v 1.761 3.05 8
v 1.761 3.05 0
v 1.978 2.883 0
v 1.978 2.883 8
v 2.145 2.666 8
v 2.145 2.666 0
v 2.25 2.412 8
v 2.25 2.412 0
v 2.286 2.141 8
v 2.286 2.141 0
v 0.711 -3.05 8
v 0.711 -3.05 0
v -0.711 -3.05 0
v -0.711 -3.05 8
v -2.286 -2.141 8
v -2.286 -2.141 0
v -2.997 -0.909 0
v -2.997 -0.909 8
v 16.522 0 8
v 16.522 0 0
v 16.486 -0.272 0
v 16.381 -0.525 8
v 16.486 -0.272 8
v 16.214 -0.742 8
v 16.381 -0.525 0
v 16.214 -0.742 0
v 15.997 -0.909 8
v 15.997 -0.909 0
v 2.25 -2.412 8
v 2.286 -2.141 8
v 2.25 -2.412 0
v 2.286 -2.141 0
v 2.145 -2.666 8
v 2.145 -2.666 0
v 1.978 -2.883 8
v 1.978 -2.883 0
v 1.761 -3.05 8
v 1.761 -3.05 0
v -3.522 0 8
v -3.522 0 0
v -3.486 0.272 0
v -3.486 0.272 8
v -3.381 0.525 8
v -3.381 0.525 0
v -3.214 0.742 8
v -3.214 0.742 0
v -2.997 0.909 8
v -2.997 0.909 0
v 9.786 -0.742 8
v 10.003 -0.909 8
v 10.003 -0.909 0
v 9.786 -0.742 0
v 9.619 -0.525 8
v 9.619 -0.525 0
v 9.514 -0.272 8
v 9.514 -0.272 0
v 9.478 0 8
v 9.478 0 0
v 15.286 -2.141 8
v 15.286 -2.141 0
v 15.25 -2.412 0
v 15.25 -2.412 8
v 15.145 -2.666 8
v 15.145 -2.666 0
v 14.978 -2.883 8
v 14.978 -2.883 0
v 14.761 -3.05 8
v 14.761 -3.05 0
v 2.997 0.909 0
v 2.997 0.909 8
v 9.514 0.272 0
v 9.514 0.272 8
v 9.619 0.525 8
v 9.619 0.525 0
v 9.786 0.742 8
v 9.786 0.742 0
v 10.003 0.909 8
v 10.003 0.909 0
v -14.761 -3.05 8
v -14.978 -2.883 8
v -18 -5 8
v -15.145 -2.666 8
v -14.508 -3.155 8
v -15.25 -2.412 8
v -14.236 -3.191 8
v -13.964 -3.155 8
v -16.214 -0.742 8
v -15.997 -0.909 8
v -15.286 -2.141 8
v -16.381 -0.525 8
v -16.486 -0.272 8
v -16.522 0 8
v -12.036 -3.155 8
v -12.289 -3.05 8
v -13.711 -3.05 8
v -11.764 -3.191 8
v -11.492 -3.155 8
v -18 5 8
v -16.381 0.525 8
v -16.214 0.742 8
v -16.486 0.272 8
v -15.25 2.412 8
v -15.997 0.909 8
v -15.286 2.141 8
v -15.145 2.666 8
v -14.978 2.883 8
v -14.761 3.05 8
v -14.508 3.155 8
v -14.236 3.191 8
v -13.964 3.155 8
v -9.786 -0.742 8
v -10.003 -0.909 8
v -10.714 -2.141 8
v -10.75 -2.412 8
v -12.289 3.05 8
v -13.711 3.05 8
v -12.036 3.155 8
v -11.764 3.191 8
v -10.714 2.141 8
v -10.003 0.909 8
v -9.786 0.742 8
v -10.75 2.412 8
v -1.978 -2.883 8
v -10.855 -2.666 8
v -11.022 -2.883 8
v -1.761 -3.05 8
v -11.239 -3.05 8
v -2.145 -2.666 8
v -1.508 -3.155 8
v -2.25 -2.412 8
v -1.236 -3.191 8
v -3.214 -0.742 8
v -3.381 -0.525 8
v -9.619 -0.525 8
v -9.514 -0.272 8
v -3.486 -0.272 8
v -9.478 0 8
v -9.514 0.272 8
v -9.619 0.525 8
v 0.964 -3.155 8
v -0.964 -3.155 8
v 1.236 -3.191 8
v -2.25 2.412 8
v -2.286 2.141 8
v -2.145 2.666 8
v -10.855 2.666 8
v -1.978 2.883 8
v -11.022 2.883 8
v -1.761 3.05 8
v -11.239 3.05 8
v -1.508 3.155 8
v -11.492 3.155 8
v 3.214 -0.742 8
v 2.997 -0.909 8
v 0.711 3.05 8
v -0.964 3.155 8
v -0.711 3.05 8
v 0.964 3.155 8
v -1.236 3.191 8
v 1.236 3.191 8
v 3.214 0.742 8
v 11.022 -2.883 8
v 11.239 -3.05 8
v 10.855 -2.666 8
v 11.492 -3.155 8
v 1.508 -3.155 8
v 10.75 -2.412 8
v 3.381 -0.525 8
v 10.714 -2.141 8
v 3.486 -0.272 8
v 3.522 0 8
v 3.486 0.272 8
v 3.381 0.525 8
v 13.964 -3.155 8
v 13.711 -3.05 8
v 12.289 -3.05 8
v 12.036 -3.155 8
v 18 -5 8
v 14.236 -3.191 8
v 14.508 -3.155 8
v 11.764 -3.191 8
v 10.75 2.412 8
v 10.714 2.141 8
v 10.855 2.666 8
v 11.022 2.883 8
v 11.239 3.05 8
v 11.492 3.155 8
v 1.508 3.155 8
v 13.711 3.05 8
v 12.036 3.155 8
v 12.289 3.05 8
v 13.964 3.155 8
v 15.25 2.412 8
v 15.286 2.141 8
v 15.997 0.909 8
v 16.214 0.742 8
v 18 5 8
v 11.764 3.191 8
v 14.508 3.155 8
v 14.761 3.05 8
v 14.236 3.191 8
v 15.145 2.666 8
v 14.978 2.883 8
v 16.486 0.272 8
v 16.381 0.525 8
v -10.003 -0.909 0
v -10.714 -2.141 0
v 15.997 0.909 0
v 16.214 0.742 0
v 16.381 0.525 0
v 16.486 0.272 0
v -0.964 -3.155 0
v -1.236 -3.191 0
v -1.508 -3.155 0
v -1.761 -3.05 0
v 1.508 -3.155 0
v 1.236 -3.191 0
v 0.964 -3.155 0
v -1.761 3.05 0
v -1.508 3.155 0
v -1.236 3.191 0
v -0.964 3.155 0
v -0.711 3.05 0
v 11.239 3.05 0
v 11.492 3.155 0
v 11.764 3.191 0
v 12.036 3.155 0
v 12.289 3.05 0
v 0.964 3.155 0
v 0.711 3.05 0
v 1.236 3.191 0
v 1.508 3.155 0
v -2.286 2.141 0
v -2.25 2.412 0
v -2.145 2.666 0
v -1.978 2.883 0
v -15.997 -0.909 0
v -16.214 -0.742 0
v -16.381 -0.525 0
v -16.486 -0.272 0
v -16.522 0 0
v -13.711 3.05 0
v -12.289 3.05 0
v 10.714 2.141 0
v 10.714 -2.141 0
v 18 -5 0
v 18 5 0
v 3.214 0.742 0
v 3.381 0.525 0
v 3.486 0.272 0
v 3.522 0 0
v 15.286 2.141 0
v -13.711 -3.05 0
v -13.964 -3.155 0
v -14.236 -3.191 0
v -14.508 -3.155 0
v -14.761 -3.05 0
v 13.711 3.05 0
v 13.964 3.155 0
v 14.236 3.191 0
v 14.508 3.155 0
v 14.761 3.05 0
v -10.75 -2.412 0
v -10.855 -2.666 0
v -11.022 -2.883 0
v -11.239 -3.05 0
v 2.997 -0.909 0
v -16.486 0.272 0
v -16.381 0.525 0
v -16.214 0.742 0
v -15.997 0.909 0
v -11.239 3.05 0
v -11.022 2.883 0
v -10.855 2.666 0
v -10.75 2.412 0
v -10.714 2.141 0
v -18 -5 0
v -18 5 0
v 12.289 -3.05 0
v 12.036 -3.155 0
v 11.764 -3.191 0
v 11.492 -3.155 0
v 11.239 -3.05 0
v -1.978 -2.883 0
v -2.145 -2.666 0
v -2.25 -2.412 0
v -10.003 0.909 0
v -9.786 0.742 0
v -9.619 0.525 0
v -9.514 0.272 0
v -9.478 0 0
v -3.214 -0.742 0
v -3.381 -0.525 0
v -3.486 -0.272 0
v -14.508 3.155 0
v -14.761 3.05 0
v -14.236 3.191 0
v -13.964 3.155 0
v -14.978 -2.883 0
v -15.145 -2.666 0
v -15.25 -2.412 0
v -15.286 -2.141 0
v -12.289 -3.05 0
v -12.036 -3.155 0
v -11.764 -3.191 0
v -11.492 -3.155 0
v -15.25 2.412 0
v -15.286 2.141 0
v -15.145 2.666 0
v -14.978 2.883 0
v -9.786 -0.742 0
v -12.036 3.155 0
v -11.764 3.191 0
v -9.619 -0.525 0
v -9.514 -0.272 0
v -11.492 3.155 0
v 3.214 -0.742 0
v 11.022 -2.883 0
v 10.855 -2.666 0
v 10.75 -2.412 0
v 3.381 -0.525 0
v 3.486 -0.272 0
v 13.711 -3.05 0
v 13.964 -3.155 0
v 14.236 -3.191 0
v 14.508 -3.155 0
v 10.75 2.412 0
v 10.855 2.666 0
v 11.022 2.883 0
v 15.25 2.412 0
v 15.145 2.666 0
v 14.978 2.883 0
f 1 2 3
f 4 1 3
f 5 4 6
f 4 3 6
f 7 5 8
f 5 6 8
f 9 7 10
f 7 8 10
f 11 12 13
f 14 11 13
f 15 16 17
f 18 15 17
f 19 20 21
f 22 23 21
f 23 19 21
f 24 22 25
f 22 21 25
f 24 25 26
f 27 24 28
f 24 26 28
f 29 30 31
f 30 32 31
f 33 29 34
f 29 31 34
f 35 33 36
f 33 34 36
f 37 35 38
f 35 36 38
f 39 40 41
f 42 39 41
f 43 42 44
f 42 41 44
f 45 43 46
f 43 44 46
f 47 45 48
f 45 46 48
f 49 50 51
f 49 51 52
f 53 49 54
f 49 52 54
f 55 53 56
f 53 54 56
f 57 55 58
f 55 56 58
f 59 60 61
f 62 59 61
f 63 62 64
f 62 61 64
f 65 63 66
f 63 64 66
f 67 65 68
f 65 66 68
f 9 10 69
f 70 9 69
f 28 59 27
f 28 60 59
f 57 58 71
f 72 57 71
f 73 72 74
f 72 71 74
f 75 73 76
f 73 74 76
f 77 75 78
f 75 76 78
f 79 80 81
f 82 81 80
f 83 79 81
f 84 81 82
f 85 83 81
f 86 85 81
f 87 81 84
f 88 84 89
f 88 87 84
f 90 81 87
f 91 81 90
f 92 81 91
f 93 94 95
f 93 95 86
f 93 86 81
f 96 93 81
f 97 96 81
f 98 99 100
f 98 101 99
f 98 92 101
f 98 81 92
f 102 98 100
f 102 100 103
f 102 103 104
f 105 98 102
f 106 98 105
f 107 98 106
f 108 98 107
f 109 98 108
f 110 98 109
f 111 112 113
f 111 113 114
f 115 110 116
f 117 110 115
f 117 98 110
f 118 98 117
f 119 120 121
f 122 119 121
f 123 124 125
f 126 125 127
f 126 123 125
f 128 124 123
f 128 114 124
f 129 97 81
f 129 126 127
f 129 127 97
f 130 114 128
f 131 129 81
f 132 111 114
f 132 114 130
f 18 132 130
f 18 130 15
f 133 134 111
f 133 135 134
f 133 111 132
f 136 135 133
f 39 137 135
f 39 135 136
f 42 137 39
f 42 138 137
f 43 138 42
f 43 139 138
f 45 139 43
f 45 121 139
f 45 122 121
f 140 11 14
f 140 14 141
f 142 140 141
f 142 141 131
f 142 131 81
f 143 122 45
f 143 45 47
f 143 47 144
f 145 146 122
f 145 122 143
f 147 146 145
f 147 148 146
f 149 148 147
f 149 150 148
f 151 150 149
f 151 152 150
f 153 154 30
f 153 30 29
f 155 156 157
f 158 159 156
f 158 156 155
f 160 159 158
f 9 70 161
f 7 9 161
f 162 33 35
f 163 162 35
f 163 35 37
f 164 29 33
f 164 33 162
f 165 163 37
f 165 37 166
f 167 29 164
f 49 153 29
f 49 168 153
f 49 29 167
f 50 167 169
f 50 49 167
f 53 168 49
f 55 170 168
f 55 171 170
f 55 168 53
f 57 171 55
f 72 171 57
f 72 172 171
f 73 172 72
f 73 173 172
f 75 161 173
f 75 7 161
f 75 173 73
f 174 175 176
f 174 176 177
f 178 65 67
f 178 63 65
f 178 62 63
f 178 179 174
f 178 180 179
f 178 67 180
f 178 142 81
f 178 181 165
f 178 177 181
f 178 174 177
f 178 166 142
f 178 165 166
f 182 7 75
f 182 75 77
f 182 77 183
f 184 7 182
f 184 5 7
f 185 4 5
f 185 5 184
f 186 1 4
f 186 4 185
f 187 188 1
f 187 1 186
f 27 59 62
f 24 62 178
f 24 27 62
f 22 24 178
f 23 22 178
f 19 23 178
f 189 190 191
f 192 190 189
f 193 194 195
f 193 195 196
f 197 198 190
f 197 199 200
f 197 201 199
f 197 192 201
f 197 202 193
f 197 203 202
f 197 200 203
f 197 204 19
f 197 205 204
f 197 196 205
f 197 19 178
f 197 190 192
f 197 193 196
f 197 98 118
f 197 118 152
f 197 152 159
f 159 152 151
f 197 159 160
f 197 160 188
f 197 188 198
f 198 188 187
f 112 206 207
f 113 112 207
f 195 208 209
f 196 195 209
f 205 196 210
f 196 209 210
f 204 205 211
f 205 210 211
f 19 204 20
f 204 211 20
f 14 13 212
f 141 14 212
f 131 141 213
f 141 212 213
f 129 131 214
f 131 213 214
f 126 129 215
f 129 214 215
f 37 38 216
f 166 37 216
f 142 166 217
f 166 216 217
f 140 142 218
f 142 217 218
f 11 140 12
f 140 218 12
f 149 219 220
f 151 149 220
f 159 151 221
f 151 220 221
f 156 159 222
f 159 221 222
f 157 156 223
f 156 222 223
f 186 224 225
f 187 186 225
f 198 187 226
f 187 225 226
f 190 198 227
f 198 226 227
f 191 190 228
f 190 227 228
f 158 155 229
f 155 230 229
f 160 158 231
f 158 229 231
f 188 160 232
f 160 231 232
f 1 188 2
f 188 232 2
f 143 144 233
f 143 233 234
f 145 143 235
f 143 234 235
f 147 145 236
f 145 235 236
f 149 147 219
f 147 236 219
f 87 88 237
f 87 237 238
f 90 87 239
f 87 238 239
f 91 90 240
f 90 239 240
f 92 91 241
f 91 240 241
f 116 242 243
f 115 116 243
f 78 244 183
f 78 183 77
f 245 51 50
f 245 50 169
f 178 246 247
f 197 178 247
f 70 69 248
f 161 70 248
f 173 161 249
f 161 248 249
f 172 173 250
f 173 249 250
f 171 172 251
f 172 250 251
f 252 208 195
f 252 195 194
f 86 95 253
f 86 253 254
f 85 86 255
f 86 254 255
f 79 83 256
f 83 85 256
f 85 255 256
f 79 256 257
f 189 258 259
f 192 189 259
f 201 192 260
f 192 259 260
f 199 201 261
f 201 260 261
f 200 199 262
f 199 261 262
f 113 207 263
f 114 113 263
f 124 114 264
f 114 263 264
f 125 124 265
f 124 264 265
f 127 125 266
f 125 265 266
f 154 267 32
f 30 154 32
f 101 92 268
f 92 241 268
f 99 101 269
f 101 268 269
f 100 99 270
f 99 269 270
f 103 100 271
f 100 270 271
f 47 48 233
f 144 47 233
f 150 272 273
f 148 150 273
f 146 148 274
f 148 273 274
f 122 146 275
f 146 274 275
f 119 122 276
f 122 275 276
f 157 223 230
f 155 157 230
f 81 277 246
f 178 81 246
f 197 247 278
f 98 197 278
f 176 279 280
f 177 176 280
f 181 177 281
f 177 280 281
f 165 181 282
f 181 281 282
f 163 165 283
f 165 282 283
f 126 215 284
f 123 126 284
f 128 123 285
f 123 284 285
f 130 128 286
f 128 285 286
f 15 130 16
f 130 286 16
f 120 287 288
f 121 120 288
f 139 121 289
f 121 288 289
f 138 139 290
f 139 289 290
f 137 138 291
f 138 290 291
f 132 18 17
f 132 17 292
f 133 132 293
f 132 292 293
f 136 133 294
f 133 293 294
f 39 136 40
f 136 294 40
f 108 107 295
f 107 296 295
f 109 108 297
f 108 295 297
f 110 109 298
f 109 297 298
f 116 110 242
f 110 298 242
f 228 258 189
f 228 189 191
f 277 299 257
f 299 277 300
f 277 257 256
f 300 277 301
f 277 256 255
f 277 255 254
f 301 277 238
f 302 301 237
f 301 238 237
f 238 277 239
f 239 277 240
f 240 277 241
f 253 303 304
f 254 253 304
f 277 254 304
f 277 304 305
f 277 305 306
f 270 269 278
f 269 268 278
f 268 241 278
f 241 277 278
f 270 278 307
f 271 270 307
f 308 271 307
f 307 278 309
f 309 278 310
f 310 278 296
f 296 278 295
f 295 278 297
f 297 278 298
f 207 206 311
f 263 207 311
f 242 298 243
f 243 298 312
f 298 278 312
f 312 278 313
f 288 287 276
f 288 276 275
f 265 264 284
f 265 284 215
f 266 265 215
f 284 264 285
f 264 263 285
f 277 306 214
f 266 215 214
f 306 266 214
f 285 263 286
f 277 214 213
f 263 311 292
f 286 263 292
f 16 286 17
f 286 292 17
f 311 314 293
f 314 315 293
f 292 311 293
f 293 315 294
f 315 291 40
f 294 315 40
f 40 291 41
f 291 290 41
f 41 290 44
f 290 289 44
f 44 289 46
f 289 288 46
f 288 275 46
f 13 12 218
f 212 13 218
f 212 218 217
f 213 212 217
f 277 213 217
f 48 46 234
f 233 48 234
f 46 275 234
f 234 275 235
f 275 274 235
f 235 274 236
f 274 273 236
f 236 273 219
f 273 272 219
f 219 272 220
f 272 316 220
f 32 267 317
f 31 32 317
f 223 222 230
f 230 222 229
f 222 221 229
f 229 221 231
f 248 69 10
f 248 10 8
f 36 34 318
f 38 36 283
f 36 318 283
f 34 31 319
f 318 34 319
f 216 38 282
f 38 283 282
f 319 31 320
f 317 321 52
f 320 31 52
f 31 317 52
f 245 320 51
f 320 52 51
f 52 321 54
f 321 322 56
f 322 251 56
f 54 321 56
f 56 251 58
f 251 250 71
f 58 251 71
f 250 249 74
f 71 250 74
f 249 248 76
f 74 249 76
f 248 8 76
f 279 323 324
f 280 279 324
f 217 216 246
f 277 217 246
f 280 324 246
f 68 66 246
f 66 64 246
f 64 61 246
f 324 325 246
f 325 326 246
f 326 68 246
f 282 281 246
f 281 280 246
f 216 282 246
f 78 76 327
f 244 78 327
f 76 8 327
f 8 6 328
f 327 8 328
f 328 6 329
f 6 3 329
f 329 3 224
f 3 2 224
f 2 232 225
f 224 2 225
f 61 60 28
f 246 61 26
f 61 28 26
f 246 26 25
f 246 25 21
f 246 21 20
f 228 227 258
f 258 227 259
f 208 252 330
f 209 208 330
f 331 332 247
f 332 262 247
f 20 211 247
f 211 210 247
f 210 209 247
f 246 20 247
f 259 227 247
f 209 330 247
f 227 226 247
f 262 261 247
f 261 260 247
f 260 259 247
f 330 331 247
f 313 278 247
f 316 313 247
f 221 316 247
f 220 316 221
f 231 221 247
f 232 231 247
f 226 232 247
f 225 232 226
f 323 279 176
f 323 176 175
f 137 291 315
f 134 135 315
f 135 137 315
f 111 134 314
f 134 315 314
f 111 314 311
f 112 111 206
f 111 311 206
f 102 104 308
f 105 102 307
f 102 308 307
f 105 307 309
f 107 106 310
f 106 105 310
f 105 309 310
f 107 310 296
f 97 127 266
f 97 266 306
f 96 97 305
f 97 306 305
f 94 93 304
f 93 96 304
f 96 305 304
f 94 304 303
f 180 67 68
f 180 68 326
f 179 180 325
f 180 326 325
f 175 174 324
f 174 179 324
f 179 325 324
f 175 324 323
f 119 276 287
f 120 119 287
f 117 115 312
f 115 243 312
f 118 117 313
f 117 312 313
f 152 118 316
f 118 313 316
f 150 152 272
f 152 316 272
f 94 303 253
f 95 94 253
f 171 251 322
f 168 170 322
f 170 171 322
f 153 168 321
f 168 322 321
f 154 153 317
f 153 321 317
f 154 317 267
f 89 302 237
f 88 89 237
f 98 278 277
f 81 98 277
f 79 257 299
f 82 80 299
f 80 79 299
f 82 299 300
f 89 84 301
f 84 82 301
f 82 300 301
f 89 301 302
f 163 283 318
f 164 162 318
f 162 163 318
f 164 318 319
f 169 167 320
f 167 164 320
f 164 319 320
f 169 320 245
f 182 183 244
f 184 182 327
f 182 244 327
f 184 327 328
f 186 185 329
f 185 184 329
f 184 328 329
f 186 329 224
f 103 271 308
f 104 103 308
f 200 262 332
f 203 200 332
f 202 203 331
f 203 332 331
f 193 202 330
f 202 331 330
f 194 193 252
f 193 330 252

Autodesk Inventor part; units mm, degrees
ref_plane "YZ Plane" through (0, 0, 0) normal (1, 0, 0) x (0, 1, 0)
ref_plane "XZ Plane" through (0, 0, 0) normal (0, 1, 0) x (-1, 0, 0)
ref_plane "XY Plane" through (0, 0, 0) normal (0, 0, 1) x (1, 0, 0)
sketch "スケッチ1" plane through (0, 0, 0) normal (0, 0, 1) x (1, 0, 0)
  line L0 (-18, -5) -> (18, -5)
  line L1 (18, -5) -> (18, 5)
  line L2 (18, 5) -> (-18, 5)
  line L3 (-18, 5) -> (-18, -5)
  line L4 (-18, -5) -> (18, 5) construction
  line L5 (18, -5) -> (-18, 5) construction
  circle A0 centre (-13, 0) radius 1.55
  circle A1 centre (0, 0) radius 1.55
  line L6 (0, 0) -> (0, 5) construction
  line L7 (-12.5995, 5) -> (4.4005, 5) construction
  line L8 (-8.5, -4) -> (8.5, -4) construction
  line L9 (-11.2391, -3.05) -> (-14.7609, -3.05)
  line L10 (-14.7609, -3.05) -> (-16.5218, 0)
  line L11 (-16.5218, 0) -> (-14.7609, 3.05)
  line L12 (-14.7609, 3.05) -> (-11.2391, 3.05)
  line L13 (-11.2391, 3.05) -> (-9.4782, 0)
  line L14 (-9.4782, 0) -> (-11.2391, -3.05)
  circle A2 centre (-15.4718, 0) radius 1.05
  circle A3 centre (-14.2359, -2.1407) radius 1.05
  circle A4 centre (-11.7641, -2.1407) radius 1.05
  circle A5 centre (-10.5282, 0) radius 1.05
  circle A6 centre (-11.7641, 2.1407) radius 1.05
  circle A7 centre (-14.2359, 2.1407) radius 1.05
  circle A8 centre (13, 0) radius 1.55
  line L15 (11.2391, -3.05) -> (14.7609, -3.05)
  line L16 (14.7609, -3.05) -> (16.5218, 0)
  line L17 (16.5218, 0) -> (14.7609, 3.05)
  line L18 (14.7609, 3.05) -> (11.2391, 3.05)
  line L19 (11.2391, 3.05) -> (9.4782, 0)
  line L20 (9.4782, 0) -> (11.2391, -3.05)
  circle A9 centre (15.4718, 0) radius 1.05
  circle A10 centre (14.2359, -2.1407) radius 1.05
  circle A11 centre (11.7641, -2.1407) radius 1.05
  circle A12 centre (10.5282, 0) radius 1.05
  circle A13 centre (11.7641, 2.1407) radius 1.05
  circle A14 centre (14.2359, 2.1407) radius 1.05
  circle A15 centre (-13, 0) radius 5 construction
  line L21 (1.7609, -3.05) -> (-1.7609, -3.05)
  line L22 (-1.7609, -3.05) -> (-3.5218, 0)
  line L23 (-3.5218, 0) -> (-1.7609, 3.05)
  line L24 (-1.7609, 3.05) -> (1.7609, 3.05)
  line L25 (1.7609, 3.05) -> (3.5218, 0)
  line L26 (3.5218, 0) -> (1.7609, -3.05)
  circle A16 centre (-2.4718, 0) radius 1.05
  circle A17 centre (-1.2359, -2.1407) radius 1.05
  circle A18 centre (1.2359, -2.1407) radius 1.05
  circle A19 centre (2.4718, 0) radius 1.05
  circle A20 centre (1.2359, 2.1407) radius 1.05
  circle A21 centre (-1.2359, 2.1407) radius 1.05
  point P0 (-11.2391, -3.05)
  point P1 (-9.4782, 0)
  point P2 (-11.2391, 3.05)
  point P3 (-14.7609, 3.05)
  point P4 (11.2391, -3.05)
  point P5 (9.4782, 0)
  point P6 (11.2391, 3.05)
  point P7 (14.7609, 3.05)
  point P8 (-1.7609, -3.05)
  point P9 (1.7609, -3.05)
  point P10 (3.5218, 0)
  point P11 (1.7609, 3.05)
  point P12 (-1.7609, 3.05)
  dimension "d19" = 2.1
  dimension "d1" = 3.1
  dimension "d4" = 13
  dimension "d5" = 10
  dimension "d20" = 6.1
  dimension "d23" = 360
  dimension "d33" = 360
extrude "押し出し1" add sketch "スケッチ1" along normal blind 8
equation "\"d4\" = d0"
equation "\"d0\" = 13"
properties part number "胴体_サブフレーム_1_2" material "アセタール樹脂、黒"
